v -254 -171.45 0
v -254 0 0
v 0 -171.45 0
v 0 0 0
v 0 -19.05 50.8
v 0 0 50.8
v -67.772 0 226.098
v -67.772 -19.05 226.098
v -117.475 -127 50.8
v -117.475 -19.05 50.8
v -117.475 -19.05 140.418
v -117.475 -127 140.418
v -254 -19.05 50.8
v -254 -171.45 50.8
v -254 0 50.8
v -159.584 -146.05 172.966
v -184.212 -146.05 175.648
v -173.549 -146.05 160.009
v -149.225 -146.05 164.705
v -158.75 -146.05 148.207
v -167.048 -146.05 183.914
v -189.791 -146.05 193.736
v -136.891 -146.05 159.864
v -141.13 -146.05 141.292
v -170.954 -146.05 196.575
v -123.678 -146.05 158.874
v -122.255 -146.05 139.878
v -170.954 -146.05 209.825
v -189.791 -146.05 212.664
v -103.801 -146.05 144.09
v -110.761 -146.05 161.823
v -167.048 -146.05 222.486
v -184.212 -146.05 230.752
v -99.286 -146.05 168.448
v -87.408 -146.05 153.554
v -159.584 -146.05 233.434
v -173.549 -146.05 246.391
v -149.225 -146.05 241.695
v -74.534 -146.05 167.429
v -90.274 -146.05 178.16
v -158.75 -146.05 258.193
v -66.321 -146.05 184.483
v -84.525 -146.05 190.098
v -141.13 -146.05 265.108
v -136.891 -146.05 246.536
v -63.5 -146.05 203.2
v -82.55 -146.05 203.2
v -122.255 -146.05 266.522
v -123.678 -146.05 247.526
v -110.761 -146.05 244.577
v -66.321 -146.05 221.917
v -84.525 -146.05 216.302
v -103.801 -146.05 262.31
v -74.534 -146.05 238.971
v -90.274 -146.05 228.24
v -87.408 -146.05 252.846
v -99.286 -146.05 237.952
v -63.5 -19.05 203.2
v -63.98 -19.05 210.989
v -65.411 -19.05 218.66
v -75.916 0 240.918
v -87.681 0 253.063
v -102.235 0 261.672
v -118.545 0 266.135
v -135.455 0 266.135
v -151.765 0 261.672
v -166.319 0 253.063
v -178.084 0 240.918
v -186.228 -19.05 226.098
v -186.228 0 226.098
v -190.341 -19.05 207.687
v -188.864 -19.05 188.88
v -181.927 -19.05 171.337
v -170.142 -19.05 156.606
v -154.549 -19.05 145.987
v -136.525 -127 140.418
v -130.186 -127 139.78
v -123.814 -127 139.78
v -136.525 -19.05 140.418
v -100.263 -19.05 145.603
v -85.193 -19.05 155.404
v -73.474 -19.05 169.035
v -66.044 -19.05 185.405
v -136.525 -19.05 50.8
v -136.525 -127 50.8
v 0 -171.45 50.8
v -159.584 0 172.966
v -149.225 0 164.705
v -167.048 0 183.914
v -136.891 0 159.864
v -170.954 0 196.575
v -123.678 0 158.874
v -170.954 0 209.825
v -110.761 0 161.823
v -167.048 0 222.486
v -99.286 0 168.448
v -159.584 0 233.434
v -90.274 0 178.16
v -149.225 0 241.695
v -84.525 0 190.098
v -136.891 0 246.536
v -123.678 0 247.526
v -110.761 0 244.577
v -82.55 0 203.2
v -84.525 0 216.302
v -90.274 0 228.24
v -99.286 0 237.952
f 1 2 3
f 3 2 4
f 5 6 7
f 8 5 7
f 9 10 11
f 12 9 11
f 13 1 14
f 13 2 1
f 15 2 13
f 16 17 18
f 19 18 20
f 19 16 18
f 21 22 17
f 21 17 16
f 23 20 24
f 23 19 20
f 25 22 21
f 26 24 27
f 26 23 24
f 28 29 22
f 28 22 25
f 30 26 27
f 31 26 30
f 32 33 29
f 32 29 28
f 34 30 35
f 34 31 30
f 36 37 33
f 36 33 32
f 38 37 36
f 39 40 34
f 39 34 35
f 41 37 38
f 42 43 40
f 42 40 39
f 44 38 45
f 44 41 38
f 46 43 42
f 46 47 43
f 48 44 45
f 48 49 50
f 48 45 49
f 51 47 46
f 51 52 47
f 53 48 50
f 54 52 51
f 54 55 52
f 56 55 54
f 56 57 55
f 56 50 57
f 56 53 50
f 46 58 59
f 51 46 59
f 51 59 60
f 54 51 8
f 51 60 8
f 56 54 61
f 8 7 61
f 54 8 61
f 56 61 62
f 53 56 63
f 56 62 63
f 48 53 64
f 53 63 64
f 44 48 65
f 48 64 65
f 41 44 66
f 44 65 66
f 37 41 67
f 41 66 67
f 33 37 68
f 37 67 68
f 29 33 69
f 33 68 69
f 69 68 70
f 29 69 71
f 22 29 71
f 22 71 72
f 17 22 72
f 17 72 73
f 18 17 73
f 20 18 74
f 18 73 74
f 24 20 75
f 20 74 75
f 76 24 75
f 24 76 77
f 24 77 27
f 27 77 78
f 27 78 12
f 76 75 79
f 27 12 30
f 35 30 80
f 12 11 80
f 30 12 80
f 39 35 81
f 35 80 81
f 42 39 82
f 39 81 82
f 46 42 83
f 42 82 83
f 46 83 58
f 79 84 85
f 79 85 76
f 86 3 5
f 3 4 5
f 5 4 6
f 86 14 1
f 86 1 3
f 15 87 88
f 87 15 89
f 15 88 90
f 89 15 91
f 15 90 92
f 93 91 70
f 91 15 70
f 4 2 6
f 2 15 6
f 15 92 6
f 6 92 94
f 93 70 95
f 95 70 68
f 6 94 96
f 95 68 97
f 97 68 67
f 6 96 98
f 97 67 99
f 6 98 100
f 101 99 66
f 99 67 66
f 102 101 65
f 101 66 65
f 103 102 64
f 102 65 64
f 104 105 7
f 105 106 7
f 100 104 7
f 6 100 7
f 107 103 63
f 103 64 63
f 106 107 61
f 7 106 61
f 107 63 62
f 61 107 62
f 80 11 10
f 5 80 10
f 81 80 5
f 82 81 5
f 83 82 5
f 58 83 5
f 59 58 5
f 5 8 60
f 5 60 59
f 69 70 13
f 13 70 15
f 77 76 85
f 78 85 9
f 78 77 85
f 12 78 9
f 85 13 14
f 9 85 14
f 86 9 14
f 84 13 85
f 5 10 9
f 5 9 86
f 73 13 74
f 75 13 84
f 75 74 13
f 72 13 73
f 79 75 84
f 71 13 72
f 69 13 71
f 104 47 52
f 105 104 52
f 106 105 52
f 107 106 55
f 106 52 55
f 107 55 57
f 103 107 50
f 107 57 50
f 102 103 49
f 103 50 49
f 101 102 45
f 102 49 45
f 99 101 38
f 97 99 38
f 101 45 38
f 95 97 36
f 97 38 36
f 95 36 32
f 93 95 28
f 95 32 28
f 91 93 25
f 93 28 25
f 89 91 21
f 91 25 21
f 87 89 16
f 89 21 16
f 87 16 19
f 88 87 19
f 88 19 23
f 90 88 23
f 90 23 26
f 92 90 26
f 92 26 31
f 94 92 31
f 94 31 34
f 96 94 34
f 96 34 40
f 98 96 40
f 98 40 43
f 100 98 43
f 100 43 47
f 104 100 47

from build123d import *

# Parameters (mm, degrees)
F2_DEPTH  = 19.05
F3_W      = 254
F3_H      = 50.8
F4_DEPTH  = 152.4
F5_W      = 19.05
F5_H      = 152.4
F6_DEPTH  = 107.95
F7_R      = 63.5
F8_DEPTH  = 127
F9_R      = 44.45
F10_DEPTH = 146.051


# Not quite as in the source:
# - a variable given as a bare number and used for a length is read in inches; the dataset says mm whatever the document's units were


with BuildPart() as f2:
    # F1 (on Front) → F2 (new body)
    with BuildSketch(Plane.XZ):
        with BuildLine():
            Line((-254, 0), (0, 0))
            Line((0, 0), (0, 50.8))
            Line((0, 50.8), (-67.7722531834, 226.0981223472))
            ThreePointArc((-67.7722531834, 226.0981223472), (-127, 266.7), (-186.2277468166, 226.0981223472))
            Line((-186.2277468166, 226.0981223472), (-254, 50.8))
            Line((-254, 50.8), (-254, 0))
        make_face()
    extrude(amount=F2_DEPTH)

    # F3 (on face) → F4 (join)
    with BuildSketch(Plane.XZ.offset(19.05)):
        with Locations((-127, 25.4)):
            Rectangle(F3_W, F3_H)
    extrude(amount=F4_DEPTH)

    # F5 (on face) → F6 (join)
    with BuildSketch(Plane.XZ.offset(19.05)):
        with Locations((-127, 127)):
            Rectangle(F5_W, F5_H)
    extrude(amount=F6_DEPTH)

    # F7 (on face) → F8 (join)
    with BuildSketch(Plane.XZ.offset(19.05)):
        with Locations((-127, 203.2)):
            Circle(F7_R)
    extrude(amount=F8_DEPTH)

    # F9 (on face) → F10 (cut, through all)
    with BuildSketch(Plane.XZ.offset(146.05)):
        with Locations((-127, 203.2)):
            Circle(F9_R)
    extrude(amount=-F10_DEPTH, mode=Mode.SUBTRACT)


solid = f2.part
